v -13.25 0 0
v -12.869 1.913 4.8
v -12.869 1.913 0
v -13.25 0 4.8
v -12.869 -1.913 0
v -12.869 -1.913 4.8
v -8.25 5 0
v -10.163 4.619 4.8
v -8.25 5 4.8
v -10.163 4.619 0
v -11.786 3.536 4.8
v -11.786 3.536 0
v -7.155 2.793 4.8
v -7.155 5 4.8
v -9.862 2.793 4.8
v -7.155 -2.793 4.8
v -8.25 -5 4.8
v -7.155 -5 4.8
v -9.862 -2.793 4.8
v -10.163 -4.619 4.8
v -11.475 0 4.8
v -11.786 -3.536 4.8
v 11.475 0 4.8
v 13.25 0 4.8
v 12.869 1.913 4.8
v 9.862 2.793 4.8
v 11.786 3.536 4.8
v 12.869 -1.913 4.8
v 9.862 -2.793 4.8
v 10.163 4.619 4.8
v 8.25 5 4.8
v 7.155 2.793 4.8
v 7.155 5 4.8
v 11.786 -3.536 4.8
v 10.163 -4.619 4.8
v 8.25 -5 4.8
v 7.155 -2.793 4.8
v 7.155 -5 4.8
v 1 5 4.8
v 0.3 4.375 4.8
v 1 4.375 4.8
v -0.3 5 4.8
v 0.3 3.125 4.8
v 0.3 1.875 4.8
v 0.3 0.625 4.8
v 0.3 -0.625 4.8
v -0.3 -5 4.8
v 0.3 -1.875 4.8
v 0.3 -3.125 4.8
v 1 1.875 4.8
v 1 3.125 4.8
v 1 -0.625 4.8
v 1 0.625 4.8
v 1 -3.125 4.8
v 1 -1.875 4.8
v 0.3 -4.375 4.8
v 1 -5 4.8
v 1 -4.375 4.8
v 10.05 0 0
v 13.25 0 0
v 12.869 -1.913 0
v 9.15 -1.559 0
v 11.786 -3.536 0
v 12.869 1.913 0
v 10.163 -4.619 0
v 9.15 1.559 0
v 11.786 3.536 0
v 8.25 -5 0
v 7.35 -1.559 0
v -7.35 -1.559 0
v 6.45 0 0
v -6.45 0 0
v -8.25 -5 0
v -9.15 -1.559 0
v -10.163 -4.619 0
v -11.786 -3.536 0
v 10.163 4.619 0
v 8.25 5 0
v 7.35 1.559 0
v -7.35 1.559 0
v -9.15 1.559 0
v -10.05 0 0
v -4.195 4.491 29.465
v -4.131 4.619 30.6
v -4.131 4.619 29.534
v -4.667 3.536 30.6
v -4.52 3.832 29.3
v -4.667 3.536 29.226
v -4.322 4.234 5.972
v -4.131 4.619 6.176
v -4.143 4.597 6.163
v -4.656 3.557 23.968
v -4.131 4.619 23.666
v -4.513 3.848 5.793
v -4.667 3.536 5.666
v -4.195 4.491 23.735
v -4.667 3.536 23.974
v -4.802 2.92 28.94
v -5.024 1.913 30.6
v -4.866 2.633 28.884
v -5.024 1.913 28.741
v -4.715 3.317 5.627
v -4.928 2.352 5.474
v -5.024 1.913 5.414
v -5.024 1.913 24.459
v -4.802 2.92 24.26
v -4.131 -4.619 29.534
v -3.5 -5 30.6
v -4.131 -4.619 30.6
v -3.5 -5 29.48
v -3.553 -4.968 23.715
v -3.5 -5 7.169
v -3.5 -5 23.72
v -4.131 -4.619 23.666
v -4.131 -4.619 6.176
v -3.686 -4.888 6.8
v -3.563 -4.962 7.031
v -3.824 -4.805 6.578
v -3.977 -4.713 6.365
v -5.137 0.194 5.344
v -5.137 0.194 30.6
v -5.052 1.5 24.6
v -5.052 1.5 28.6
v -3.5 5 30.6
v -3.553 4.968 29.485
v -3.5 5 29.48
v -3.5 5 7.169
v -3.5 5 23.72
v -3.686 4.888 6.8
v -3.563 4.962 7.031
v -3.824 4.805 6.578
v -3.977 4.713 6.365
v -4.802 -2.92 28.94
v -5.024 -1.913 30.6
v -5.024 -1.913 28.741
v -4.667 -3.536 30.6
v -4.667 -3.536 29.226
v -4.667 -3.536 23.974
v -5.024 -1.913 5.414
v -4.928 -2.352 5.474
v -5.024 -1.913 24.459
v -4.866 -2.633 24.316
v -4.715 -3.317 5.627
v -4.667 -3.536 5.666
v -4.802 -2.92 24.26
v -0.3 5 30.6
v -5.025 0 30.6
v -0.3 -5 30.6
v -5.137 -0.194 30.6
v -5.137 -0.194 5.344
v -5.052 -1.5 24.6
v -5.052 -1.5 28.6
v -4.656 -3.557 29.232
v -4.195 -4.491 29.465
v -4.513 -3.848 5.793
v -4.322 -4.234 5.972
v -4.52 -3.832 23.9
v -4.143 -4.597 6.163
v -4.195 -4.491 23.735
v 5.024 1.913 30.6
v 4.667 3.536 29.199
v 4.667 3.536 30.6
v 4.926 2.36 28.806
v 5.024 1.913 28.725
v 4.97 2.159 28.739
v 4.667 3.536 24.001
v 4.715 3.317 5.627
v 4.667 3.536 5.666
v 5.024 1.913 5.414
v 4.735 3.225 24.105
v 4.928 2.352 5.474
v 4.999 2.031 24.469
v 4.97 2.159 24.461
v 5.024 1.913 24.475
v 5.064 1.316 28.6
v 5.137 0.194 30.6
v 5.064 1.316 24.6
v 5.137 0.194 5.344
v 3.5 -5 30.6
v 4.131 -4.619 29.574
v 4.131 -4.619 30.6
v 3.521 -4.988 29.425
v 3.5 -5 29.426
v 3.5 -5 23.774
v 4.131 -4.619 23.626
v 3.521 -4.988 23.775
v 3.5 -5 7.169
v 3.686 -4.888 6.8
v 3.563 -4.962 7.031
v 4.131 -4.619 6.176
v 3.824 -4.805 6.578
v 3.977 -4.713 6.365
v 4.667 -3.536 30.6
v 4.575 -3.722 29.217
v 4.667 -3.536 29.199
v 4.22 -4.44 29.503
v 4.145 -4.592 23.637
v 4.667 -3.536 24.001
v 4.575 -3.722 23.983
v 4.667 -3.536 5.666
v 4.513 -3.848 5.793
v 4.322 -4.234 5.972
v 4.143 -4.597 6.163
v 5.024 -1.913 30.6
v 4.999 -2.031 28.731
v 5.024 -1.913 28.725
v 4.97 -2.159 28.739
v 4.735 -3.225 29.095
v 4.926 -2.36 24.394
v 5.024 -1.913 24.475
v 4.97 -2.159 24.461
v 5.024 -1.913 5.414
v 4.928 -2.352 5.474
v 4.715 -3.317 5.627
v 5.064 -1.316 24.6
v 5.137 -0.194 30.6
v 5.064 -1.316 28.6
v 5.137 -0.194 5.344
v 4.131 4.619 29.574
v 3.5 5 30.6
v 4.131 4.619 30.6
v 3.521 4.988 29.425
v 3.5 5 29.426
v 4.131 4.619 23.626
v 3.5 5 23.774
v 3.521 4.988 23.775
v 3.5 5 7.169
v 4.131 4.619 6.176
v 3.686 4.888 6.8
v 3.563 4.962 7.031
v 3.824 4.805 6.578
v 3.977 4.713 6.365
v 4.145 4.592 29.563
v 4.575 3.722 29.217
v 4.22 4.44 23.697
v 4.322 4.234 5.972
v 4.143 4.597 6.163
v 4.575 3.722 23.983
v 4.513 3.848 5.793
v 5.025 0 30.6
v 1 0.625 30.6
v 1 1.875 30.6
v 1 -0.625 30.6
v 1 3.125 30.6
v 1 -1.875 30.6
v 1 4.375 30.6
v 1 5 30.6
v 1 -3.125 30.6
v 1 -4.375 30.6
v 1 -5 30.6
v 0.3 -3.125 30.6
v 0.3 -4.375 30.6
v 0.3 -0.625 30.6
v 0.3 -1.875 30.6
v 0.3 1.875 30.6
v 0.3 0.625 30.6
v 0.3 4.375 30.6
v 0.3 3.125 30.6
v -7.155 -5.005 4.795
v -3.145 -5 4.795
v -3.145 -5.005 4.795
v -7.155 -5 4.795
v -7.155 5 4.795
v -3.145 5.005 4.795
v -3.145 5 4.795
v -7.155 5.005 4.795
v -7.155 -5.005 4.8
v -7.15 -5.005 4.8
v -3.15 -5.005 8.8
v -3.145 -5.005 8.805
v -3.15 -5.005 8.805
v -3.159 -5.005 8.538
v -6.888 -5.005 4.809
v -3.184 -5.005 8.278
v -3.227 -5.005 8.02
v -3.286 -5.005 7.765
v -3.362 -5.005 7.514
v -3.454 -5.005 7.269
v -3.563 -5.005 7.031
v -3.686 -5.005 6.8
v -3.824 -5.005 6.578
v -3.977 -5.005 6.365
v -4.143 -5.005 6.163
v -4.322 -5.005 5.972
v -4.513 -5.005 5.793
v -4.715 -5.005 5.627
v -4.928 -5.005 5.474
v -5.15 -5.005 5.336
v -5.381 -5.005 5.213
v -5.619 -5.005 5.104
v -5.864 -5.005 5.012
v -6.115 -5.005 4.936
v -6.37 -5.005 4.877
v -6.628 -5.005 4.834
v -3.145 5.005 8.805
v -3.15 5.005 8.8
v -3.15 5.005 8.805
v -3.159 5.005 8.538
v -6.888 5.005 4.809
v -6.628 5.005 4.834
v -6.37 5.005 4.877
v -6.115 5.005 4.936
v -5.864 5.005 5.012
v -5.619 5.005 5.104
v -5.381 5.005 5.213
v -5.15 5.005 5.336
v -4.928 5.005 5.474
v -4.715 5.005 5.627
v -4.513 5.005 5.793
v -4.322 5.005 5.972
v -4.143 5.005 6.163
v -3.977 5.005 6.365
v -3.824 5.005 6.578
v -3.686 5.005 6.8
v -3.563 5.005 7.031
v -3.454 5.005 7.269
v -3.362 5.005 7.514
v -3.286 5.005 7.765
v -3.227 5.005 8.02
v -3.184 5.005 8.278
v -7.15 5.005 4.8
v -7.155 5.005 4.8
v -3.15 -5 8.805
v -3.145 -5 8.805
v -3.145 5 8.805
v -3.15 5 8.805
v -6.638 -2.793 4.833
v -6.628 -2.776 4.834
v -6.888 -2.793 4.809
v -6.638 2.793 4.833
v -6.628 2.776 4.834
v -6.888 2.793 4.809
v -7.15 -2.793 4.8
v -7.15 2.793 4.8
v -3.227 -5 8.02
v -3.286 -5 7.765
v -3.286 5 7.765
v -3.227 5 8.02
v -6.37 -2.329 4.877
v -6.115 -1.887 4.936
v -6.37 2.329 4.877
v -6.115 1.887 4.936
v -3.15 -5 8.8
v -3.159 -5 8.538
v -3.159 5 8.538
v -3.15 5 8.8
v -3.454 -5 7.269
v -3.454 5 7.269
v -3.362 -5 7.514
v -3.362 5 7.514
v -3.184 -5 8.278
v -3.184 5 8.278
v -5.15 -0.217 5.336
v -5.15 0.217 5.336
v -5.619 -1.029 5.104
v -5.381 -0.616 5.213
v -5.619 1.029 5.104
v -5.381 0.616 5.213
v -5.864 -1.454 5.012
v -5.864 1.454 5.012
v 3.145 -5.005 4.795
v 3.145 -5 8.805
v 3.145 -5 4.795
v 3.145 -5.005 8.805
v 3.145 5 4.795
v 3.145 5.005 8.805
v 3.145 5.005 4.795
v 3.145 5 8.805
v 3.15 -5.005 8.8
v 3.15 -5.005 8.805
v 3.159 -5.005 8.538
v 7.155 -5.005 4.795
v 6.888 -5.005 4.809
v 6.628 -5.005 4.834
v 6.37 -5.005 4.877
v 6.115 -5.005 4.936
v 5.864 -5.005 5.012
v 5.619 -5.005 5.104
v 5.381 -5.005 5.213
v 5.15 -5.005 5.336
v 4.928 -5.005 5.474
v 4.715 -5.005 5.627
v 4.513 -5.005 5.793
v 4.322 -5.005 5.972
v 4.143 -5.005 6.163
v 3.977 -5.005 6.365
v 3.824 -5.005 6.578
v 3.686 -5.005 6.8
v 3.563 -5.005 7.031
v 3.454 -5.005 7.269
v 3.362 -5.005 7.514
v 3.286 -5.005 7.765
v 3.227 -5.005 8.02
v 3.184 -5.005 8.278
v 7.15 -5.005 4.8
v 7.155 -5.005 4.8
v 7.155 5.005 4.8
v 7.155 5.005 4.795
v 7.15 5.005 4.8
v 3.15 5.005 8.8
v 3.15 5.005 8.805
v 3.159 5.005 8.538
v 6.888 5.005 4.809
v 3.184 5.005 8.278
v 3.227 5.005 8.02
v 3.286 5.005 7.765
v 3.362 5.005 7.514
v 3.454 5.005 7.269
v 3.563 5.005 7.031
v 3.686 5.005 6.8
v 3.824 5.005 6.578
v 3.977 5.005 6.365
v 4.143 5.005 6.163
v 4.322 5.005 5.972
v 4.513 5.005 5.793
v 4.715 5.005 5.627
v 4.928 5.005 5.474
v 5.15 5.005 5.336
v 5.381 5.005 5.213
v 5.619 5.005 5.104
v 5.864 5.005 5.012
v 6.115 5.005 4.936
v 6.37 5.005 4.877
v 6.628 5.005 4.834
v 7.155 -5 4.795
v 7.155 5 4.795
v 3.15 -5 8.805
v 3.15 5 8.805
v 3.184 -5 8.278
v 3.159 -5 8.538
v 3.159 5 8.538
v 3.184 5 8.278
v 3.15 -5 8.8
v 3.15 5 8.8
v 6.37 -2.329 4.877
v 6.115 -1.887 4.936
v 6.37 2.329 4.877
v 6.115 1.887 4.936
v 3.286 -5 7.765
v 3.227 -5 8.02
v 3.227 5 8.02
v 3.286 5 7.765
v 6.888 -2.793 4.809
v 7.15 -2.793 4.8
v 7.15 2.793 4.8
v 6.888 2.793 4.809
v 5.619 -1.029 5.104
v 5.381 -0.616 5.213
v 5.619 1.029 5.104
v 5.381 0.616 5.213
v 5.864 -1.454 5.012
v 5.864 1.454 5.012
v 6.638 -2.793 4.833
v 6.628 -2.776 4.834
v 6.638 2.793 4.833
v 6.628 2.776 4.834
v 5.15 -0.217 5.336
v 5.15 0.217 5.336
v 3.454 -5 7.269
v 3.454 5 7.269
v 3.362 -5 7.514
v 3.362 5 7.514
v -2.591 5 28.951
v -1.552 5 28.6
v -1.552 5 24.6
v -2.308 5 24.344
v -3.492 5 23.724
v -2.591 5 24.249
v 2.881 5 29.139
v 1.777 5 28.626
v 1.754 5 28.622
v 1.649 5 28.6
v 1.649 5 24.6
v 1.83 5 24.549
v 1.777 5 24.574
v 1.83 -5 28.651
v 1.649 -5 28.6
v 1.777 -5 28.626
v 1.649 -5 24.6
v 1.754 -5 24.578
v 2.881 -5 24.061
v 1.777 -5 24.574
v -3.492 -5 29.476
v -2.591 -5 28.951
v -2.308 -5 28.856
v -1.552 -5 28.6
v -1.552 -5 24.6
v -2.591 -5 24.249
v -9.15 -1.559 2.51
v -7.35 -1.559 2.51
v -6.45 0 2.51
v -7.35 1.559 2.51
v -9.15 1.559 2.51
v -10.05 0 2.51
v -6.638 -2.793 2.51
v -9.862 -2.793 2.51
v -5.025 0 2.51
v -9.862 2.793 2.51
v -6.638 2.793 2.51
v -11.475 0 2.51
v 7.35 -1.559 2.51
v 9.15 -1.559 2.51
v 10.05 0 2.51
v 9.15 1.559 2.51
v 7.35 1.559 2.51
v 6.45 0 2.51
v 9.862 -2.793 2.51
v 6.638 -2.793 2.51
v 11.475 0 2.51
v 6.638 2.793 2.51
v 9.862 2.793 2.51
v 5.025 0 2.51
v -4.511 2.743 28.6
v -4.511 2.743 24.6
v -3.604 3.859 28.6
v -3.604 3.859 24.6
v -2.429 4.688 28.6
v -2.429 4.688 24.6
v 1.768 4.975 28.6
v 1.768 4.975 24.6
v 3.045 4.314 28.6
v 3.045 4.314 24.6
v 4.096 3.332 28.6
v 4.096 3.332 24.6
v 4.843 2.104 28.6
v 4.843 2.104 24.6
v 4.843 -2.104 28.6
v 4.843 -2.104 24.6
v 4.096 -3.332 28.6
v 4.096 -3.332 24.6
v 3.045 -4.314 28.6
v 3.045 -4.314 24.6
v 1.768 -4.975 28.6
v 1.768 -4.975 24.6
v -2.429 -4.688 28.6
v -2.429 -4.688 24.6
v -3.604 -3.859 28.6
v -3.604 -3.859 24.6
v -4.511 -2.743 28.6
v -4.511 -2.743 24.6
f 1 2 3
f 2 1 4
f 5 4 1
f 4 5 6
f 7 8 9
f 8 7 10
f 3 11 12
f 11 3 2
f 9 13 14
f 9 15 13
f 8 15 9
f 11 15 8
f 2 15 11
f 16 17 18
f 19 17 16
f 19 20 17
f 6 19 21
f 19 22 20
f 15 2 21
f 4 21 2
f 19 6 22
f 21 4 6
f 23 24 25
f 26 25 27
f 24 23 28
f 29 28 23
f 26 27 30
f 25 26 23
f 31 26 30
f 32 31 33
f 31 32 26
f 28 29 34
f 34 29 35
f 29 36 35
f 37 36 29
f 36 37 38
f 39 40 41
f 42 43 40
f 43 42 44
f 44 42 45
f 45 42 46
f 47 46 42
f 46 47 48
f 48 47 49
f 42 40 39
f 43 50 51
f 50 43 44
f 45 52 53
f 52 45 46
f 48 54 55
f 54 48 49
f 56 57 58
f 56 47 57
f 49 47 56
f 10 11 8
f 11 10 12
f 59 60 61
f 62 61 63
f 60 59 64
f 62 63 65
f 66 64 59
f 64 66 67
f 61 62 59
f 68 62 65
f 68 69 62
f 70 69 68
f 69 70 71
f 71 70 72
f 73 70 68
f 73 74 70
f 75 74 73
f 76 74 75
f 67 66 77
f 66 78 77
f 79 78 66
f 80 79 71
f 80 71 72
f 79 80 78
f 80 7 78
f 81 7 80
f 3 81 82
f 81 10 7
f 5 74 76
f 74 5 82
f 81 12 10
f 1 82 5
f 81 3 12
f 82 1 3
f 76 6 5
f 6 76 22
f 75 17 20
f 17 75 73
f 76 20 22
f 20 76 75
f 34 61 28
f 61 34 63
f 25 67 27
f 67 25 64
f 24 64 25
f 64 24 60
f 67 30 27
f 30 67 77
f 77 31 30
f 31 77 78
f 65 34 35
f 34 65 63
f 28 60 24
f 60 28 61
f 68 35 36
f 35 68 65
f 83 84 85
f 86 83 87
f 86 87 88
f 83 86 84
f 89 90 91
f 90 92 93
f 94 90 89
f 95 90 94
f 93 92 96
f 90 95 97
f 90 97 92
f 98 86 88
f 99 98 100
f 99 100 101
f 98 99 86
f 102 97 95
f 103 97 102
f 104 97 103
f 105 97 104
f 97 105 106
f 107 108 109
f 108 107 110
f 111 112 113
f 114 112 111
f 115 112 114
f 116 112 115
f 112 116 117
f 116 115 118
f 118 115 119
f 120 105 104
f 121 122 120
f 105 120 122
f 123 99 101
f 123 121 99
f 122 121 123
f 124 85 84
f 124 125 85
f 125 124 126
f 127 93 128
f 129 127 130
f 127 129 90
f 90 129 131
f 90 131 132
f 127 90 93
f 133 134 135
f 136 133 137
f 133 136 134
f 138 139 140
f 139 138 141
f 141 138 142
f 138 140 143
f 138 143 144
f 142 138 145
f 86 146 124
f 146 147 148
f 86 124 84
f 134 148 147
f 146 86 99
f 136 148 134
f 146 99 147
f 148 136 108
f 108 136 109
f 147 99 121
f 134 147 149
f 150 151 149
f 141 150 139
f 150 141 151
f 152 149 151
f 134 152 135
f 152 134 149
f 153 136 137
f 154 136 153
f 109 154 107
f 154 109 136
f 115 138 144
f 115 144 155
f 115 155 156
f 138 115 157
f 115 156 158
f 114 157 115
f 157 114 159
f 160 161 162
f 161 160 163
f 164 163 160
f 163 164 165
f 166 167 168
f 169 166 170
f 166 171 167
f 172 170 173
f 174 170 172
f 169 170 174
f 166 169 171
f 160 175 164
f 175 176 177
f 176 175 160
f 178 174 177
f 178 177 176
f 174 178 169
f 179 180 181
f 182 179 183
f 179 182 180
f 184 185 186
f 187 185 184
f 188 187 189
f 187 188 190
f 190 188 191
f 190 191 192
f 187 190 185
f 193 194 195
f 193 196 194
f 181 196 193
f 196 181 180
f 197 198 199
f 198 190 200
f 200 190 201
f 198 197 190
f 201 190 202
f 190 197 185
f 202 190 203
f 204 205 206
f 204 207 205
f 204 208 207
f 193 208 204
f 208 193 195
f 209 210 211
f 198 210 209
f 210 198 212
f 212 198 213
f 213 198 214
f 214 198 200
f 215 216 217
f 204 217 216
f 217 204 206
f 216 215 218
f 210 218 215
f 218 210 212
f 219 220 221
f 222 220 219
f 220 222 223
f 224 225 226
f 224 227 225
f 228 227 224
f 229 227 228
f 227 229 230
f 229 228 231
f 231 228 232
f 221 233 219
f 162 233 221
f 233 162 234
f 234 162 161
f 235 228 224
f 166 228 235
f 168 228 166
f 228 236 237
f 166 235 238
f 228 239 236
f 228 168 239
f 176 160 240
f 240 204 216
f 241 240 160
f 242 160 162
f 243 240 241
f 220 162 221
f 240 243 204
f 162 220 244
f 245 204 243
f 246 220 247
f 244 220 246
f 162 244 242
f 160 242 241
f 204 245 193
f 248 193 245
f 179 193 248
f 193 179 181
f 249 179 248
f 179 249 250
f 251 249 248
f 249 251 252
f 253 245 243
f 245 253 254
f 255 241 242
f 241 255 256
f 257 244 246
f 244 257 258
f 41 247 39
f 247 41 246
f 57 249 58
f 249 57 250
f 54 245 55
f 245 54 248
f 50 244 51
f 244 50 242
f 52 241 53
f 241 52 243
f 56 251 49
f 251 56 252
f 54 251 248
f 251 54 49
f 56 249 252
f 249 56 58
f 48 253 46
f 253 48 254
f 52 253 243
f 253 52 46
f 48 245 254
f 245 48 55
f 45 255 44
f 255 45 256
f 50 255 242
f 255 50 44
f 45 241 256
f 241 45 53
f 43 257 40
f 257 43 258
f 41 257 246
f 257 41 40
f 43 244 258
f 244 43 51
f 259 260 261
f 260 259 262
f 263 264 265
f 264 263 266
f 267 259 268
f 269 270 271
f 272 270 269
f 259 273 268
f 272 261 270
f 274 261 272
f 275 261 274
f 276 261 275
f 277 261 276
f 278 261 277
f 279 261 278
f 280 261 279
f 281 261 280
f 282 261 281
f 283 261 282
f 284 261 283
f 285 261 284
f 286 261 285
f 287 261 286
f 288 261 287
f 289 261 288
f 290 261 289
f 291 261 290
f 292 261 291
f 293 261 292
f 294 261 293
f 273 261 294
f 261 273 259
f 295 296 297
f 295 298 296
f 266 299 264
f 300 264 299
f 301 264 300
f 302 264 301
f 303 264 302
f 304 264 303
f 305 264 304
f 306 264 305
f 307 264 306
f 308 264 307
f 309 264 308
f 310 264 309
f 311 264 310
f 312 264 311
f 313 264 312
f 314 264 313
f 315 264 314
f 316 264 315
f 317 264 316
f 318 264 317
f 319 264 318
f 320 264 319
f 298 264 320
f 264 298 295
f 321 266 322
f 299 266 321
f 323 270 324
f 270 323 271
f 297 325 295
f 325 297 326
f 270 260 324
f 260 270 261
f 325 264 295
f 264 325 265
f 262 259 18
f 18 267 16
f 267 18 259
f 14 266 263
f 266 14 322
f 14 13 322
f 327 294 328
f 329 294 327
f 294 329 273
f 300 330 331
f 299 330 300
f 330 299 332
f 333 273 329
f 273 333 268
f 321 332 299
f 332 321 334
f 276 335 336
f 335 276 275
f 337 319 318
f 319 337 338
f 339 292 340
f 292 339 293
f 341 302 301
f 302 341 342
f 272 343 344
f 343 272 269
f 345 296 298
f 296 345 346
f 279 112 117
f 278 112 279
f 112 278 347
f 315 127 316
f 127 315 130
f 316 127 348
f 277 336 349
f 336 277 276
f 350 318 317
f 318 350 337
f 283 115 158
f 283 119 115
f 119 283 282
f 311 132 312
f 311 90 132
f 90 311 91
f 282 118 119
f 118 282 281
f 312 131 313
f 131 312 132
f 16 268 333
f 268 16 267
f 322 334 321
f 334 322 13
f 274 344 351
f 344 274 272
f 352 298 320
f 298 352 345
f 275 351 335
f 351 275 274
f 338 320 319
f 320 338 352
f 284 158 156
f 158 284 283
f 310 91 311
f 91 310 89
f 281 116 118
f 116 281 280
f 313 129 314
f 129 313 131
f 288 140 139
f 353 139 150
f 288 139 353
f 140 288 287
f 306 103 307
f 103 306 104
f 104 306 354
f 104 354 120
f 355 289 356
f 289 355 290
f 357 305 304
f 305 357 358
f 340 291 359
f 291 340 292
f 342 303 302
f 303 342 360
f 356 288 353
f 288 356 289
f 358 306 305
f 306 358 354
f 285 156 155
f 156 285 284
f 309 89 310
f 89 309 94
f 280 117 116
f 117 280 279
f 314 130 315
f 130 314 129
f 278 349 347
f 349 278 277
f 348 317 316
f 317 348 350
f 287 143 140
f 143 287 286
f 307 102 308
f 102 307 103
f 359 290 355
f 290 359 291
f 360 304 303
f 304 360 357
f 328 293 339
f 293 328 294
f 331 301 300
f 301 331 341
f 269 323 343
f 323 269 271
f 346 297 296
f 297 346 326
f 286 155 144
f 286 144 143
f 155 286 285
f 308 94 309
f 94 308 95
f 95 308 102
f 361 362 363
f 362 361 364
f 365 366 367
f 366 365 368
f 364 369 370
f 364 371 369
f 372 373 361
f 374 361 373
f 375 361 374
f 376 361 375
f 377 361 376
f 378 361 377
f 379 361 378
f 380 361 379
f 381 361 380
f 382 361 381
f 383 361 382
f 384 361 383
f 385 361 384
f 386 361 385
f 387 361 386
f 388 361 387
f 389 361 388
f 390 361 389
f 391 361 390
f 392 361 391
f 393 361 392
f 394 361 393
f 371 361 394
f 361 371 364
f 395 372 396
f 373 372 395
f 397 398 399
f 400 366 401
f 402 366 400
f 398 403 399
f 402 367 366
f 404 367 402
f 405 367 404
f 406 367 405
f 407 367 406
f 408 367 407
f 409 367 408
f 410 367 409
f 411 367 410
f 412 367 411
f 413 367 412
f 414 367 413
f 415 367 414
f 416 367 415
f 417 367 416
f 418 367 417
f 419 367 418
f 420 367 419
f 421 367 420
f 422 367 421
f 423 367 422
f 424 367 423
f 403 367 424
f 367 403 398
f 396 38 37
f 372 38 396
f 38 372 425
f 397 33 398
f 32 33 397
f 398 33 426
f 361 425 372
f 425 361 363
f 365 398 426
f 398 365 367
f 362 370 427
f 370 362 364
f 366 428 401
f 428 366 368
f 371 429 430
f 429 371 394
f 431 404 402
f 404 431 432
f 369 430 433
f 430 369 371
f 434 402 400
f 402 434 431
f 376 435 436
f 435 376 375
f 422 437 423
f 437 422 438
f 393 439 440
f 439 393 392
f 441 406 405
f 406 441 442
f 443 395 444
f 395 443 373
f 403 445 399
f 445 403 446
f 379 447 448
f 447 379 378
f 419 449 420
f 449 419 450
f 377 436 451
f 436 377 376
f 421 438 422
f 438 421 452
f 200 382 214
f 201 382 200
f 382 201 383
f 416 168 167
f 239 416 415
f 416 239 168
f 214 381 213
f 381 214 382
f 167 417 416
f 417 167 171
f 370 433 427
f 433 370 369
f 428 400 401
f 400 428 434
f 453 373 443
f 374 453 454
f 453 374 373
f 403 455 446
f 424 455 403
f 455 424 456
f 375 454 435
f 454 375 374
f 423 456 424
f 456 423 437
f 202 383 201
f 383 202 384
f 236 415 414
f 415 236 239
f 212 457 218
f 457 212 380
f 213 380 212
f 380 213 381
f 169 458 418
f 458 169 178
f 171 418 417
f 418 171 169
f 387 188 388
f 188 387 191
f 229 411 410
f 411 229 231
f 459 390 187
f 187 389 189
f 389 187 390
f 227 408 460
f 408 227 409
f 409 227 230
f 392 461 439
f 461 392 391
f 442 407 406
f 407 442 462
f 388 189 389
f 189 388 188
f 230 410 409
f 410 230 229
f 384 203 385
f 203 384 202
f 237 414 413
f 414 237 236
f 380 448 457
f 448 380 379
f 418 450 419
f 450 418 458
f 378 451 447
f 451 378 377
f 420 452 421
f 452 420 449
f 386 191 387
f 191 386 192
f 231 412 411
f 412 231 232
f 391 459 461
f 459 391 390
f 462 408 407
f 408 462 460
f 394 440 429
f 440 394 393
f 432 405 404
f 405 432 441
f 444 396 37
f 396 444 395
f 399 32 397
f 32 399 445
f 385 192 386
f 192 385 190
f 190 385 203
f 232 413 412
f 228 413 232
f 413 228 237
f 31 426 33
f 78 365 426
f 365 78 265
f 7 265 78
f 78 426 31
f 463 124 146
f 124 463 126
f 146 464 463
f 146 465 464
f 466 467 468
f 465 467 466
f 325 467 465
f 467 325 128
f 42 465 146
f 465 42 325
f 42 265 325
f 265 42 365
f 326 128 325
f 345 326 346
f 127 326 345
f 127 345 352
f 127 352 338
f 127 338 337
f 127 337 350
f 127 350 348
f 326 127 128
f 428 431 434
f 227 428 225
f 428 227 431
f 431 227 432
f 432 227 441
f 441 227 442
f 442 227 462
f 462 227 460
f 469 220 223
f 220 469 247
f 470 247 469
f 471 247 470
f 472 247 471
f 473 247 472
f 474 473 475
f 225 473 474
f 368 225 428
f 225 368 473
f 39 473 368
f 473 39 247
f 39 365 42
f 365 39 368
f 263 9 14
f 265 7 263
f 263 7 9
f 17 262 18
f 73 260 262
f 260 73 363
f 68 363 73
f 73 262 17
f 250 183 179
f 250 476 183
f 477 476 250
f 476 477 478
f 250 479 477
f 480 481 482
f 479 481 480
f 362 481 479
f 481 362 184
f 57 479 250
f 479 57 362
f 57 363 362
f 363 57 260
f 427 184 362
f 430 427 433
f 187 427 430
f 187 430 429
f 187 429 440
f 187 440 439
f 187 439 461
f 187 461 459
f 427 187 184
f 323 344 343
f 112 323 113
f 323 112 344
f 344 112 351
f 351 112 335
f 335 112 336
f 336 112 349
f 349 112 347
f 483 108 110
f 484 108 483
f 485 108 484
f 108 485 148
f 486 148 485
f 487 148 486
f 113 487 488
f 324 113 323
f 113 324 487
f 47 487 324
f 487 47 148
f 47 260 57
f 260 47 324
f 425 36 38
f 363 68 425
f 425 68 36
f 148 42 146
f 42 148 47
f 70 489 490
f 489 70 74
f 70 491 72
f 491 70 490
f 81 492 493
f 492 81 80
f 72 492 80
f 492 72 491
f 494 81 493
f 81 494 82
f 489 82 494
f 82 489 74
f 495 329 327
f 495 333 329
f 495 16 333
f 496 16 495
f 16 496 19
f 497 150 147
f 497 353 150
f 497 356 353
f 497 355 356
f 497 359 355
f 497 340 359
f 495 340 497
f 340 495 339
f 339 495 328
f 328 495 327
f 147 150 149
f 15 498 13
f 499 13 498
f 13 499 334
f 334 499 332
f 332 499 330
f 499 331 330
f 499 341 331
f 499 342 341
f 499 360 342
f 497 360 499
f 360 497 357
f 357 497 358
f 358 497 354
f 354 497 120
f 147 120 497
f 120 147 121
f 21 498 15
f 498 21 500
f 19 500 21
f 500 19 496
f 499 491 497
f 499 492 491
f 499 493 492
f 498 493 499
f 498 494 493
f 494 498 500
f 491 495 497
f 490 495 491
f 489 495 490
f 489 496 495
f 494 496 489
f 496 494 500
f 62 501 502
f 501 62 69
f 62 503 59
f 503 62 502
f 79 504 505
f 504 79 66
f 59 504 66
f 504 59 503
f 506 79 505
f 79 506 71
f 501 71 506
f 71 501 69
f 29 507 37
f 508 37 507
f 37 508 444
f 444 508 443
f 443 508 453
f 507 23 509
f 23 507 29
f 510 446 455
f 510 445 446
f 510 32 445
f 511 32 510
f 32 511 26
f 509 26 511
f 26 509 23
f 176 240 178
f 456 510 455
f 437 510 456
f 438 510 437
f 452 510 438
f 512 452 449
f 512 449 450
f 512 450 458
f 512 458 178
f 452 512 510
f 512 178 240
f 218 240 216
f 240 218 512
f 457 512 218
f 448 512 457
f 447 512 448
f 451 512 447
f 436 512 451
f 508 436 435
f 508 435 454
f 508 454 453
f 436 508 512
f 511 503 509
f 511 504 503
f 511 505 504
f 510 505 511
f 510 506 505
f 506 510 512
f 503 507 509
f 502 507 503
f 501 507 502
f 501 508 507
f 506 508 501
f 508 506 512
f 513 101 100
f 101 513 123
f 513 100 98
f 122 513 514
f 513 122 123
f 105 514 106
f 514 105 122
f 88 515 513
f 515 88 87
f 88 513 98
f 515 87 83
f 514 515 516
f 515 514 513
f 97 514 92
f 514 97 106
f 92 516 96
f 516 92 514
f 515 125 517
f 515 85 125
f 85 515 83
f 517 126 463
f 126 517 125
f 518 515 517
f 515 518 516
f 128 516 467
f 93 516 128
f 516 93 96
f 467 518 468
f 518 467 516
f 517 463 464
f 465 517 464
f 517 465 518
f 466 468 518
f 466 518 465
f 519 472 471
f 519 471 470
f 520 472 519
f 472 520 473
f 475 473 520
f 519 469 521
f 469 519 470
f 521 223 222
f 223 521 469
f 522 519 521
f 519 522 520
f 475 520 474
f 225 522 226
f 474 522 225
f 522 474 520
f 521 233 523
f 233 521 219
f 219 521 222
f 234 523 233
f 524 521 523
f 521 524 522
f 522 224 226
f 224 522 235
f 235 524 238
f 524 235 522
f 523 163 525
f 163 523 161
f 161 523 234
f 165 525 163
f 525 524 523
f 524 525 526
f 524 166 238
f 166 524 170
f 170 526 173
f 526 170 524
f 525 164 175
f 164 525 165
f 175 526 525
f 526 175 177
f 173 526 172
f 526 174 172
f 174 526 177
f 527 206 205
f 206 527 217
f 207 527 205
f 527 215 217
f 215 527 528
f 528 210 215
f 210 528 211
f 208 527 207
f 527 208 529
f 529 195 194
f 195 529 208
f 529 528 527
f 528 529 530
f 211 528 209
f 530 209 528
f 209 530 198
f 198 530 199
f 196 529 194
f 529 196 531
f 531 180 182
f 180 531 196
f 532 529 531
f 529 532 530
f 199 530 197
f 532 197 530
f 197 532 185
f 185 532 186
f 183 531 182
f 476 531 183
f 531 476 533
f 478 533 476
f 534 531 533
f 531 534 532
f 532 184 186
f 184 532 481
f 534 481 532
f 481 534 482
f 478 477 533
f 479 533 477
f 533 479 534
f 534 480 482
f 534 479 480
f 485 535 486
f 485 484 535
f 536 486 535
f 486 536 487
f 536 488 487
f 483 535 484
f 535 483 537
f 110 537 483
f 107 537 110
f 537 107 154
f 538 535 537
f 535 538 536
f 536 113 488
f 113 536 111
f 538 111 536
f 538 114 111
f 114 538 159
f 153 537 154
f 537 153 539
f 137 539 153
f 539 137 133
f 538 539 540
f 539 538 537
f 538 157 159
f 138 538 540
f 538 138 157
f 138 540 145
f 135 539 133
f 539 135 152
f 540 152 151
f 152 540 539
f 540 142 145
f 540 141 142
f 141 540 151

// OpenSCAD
// file: utilities.scad
/*
 * Utility functions.
 *
 * Originally by Hans Häggström, 2010.
 * Dual licenced under Creative Commons Attribution-Share Alike 3.0 and LGPL2 or later
 */

//include <units.scad>


/******************** Disance Poins ******************************/
function distance3D(a,b) =sqrt( (a[0] - b[0])*(a[0] - b[0]) +
                                (a[1] - b[1])*(a[1] - b[1]) +
                                (a[2] - b[2])*(a[2] - b[2]) );
//Obsolet
function distance(a, b) = distance3D(a,b);

function distance2D(a,b) = sqrt( (a[0] - b[0])*(a[0] - b[0]) +
                                (a[1] - b[1])*(a[1] - b[1]));
								
function distance1D(a,b) = sqrt(a*a+b*b);
//Obsolet
function length2(a) = distance1D(a[0],a[1]);


/************************ vector *************************/
function normalized(a) = a / (max(distance3D([0,0,0], a), 0.00001));

function normalized_axis(a) = a == "x" ? [1, 0, 0]:
                   a == "y" ? [0, 1, 0]:
                   a == "z" ? [0, 0, 1]: normalized(a);

function angleOfNormalizedVector(n) = [0, -atan2(n[2], distance1D([n[0], n[1]])), atan2(n[1], n[0]) ];

function angle(v) = angleOfNormalizedVector(normalized(v));

function angleBetweenTwoPoints(a, b) = angle(normalized(b-a));

function _angleVectore2D(a) = atan2(a[0],a[1]);
function angle_betweentTwoPoints2D (a,b) = _angleVectore2D(b-a);


/********************** Circel ***************************/

function circel_area(r) = PI * r * r;

function circel_radius3Points(a,b,c) = (distance2D(a,b) * distance2D(b,c) * distance2D(c,a)) / (4 * triangle_area3Points(a,b,c));

function circel_radius3lengths(a,b,c) = (a*b*c) / (4 * triangle_area3lengths(a,b,c));


/********************** triangle **************************/
//Satz des Heron
function triangle_area3lengths(a,b,c) = sqrt((a+b+c)*(a+b-c)*(b+c-a)*(c+a-b))/4;

function triangle_area3Points(a,b,c) = triangle_area3lengths(distance2D(a,b),distance2D(b,c),distance2D(c,a));



/************************** coordinate systems translation ****/
//[radius,phi] <=> [x,y]
function conv2D_cartesian2polar(x) = [ distance1D(x[0],x[1]) , atan2(x[1],x[0]) ];
function conv2D_polar2cartesian(x) = [ x[0]*cos(x[1]) , x[0]*sin(x[1]) ];


CENTER = 0;
LEFT = -0.5;
RIGHT = 0.5;
TOP = 0.5;
BOTTOM = -0.5;

FlatCap =0;
ExtendedCap =0.5;
CutCap =-0.5;


module fromTo(from=[0,0,0], to=[1,0,0], size=[1, 1], align=[CENTER, CENTER], material=[0.5, 0.5, 0.5], name="", endExtras=[0,0], endCaps=[FlatCap, FlatCap], rotation=[0,0,0], printString=true) {

  angle = angleBetweenTwoPoints(from, to);
  length = distance(from, to) + endCaps[0]*size[0] + endCaps[1]*size[0] + endExtras[0] + endExtras[1];

  if (length > 0) {
    if (printString) echo(str( "  " ,name, " ", size[0], "mm x ", size[1], "mm, length ", length, "mm"));

    color(material)
      translate(from)
        rotate(angle)
          translate( [ -endCaps[0]*size[0] - endExtras[0], size[0]*(-0.5-align[0]), size[1]*(-0.5+align[1]) ] )
            rotate(rotation)
              scale([length, size[0], size[1]]) child();
  }
}

module part(name) {
  echo("");
  echo(str(name, ":"));
}
// file: config.scad
/* config [c]
 * Copyright (c) 2012 by Krallinger Sebastian [s.krallinger+cc@gmail.com]
 * Dual-licensed under 
 * Creative Commons Attribution-ShareAlike 3.0 (CC BY-SA) [http://creativecommons.org/licenses/by-sa/3.0/]
 * and
 * LGPL v2 or later [http://www.gnu.org/licenses/].
 */

/******************************************************************************/ 
/*                              Main configuration                            */
/******************************************************************************/

/*-----------------------------------x axis-----------------------------------*/
c_x_axis_length = 333; // usable lenth. If you use an extruder which is longer then the H-Xtruder-Mount.scad you have to add this overcut here.
c_x_axis_smoothRod_diam = 8.1;

c_x_axis_dist = 35;

/*-----------------------------------y axis-----------------------------------*/
c_y_axis_length = 333; // usable lenth. If your extruder nozzel exit is not center to the H-Xtruder-Mount.scad you have to add the offset here.
c_y_axis_smoothRod_diam = 8.1;
c_y_axis_tabel_zDirOffset = 14.321; // offset of the center of the y axis to the tabel contact plain

/*-----------------------------------z axis-----------------------------------*/
c_z_axis_length = 333; // usable lenth. If the nozzel of the extruder exids the lower edge of the H-X-Carriage.scad than you have to add the overcut here.
c_z_axis_smoothRod_diam = 12.2;

c_z_axis_rodsDist = 32; // distance between threded rod and smooth rod

/******************************************************************************/ 
/*                                  linear Bearings                           */
/******************************************************************************/
c_lber_length       = 24.2;
c_lber_diam         = 15.3;

/*-----------------------------------x axis-----------------------------------*/
c_xAxis_lber_length = c_lber_length;
c_xAxis_lber_diam   = c_lber_diam;
/*----------------------------------y axis------------------------------------*/
c_yAxis_lber_length = c_lber_length;
c_yAxis_lber_diam   = c_lber_diam;
/*----------------------------------z axis------------------------------------*/
c_zAxis_lber_length = c_lber_length;
c_zAxis_lber_diam   = 12 + c_lber_diam-8;

/******************************************************************************/ 
/*                                    BELT                                    */
/******************************************************************************/
c_belt_thickness      = 1.3;
c_belt_width          = 6;
c_belt_teethDist      = 2.5;
c_belt_teethDepth     = 0.7;

/*-----------------------------------x axis-----------------------------------*/
//belt
c_xAxis_belt_thickness      = c_belt_thickness;
c_xAxis_belt_width          = c_belt_width;
c_xAxis_belt_teethDist      = c_belt_teethDist;
c_xAxis_belt_teethDepth     = c_belt_teethDepth;

// pully
c_xAxis_pully_diam = 9-c_xAxis_belt_thickness*2; // innes (in the teeth molde) diameter of the pully

// diviater
c_xAxis_bearingDiviater_diam = 26; // diameter of the diviater (so the diameter of the centerpoint to the teeth top of the belt) 

// distances
c_xAxis_beltCenter_xAxisDist     = 38;
c_xAxis_beltCenter_motorScrewHoleDist     = 12;

c_xAxis_beltTop_topxAxisDist = -(c_x_axis_dist/2)+c_xAxis_pully_diam/2; // distece between center of the top x axis and toothed side of the belt in z dir

/*-----------------------------------y axis-----------------------------------*/
c_yAxis_belt_thickness      = c_belt_thickness;
c_yAxis_belt_width          = c_belt_width;
c_yAxis_belt_teethDist      = c_belt_teethDist;
c_yAxis_belt_teethDepth     = c_belt_teethDepth;

c_y_axis_beltCenter_zDirOffset = 14.6; // offset of the center of the belt to the tabel contact plain

/******************************************************************************/ 
/*                                  support                                   */
/******************************************************************************/
c_xDirSupp_thredRod_altitude    = [8.266,45.497];
c_xDirSupp_thredRod_zAxisDist   = 38.95-8.5;

/******************************************************************************/ 
/*                                  motor                                     */
/******************************************************************************/
c_motorShaft_diam            = 5; // motor axis diameter
c_motorShaft_length          = 25; // motor axis length from pilot
c_motorPilot_diam            = 27.5; // motor pilot diameter
c_motorScrewHole_diam        = 3.3; // motor screw holde diameter
c_motorScrewHoles_centerDist = 43.841/2; // motor holes distance from axis center
c_motor_sideLength           = 42.1; // length of the motor side (rectangular motor)

/*-----------------------------------x axis-----------------------------------*/
c_xAxis_motorShaft_diam            = c_motorShaft_diam;
c_xAxis_motorShaft_length          = c_motorShaft_length;
c_xAxis_motorPilot_diam            = c_motorPilot_diam ;
c_xAxis_motorScrewHole_diam        = c_motorScrewHole_diam ;
c_xAxis_motorScrewHoles_centerDist = c_motorScrewHoles_centerDist;
c_xAxis_motor_sideLength           = c_motor_sideLength;

/*-----------------------------------y axis-----------------------------------*/
c_yAxis_motorShaft_diam            = c_motorShaft_diam;
c_yAxis_motorShaft_length          = c_motorShaft_length;
c_yAxis_motorPilot_diam            = c_motorPilot_diam ;
c_yAxis_motorScrewHole_diam        = c_motorScrewHole_diam ;
c_yAxis_motorScrewHoles_centerDist = c_motorScrewHoles_centerDist;
c_yAxis_motor_sideLength           = c_motor_sideLength;

/*-----------------------------------z axis-----------------------------------*/
c_zAxis_motorShaft_diam            = c_motorShaft_diam;
c_zAxis_motorShaft_length          = c_motorShaft_length;
c_zAxis_motorPilot_diam            = c_motorPilot_diam ;
c_zAxis_motorScrewHole_diam        = c_motorScrewHole_diam ;
c_zAxis_motorScrewHoles_centerDist = c_motorScrewHoles_centerDist;
c_zAxis_motor_sideLength           = c_motor_sideLength;
// file: roundEdges.scad
/* roundEdges
 * Copyright (c) 2012 by Krallinger Sebastian [s.krallinger+cc@gmail.com]
 * Dual-licensed under 
 * Creative Commons Attribution-ShareAlike 3.0 (CC BY-SA) [http://creativecommons.org/licenses/by-sa/3.0/]
 * and
 * LGPL v2 or later [http://www.gnu.org/licenses/].
 */


//Rounded Edges
module roundEdge(_a=0,_r=1,_l=1,_fn=100){
	rotate (a=[0,0,_a]){
		translate(v=[_r,_r,0]){
			rotate (a=[0,0,0]) rotate (a=[0,0,180]){
				difference() {
					translate (v=[-OS/2,-OS/2,-OS/2])
						cube (size = [_r+OS,_r+OS,_l+OS],center=false );
					translate (v=[0,0,-OS*2/2])
						cylinder (h = _l+OS*2, r=_r, center = false, $fn=_fn);
				}
			}
		}
	}
}
//roundEdge(_a=0,_l=10);
// file: teardrop.scad
// teardrop V2


module teardrop (r=4.5,h=20,top_and_bottom=false)
{
	rotate([-270,0,90])
	linear_extrude(height=h,convexity=10)
	{
		circle(r=r);
		polygon(points=[[0,0],[r*cos(30),r*sin(30)],[0.5*r,r],[-0.5*r,r],[-r*cos(30),r*sin(30)]],
				paths=[[0,1,2,3,4]]);
		if (top_and_bottom)
		polygon(points=[[0,0],[r*cos(30),-r*sin(30)],[0.5*r,-r],[-0.5*r,-r],[-r*cos(30),-r*sin(30)]],
				paths=[[0,1,2,3,4]]);

	}
}

module teardropFlat (r=4.5,h=20,top_and_bottom=false)
{
	rotate([-270,0,90])
	linear_extrude(height=h,convexity=10)
	{
		circle(r=r);
		polygon(points=[[0,0],[r*cos(20),r*sin(20)],[0.6*r,r],[-0.6*r,r],[-r*cos(20),r*sin(20)]],
				paths=[[0,1,2,3,4]]);
		if (top_and_bottom)
		polygon(points=[[0,0],[r*cos(20),-r*sin(20)],[0.5*r,-r],[-0.5*r,-r],[-r*cos(20),-r*sin(20)]],
				paths=[[0,1,2,3,4]]);

	}
}

module teardropcentering (r=4.5,h=20)
{
	rotate([-270,0,90])
	linear_extrude(height=h)
	{
		circle(r=r, $fn = 24);
		polygon(points=[[0,0],[r*cos(30),r*sin(30)],[0.5*r,1.2*r],[-0.5*r,1.2*r],[-r*cos(30),r*sin(30)]],
				paths=[[0,1,2,3,4]]);
	}
}

module teardropcentering2 (r=4.5,h=20)
{
	//rotate([-270,0,90])
	difference(){
	linear_extrude(height=h)
	{
		circle(r=r, $fn = 24);
		polygon(points=[[0,0],[r*cos(30),r*sin(30)],[0.5*r,1.2*r],[-0.5*r,1.2*r],[-r*cos(30),r*sin(30)]],
				paths=[[0,1,2,3,4]]);
	}
	translate(v = [-1.5*r, -1.5*r,-1])cube(size =[3*r,1.5*r,h+2]);
	}
}
// file: H-Y-beltClamp_alternativ.scad
/* H-Y-BeltClamp_Alternativ [Ybdaa]
 * Copyright (c) 2012 by Krallinger Sebastian [s.krallinger+cc@gmail.com]
 * Dual-licensed under
 * Creative Commons Attribution-ShareAlike 3.0 (CC BY-SA) [http://creativecommons.org/licenses/by-sa/3.0/]
 * and
 * LGPL v2 or later [http://www.gnu.org/licenses/].
 */

include <config.scad>
include <units.scad>
include <utilities.scad>
include <metric.scad>

include <roundEdges.scad>



/*------------------------------------general---------------------------------*/
Ybda_mode = "-";
//Ybda_mode = "print";  $fn=24*4;   // can be print or inspect [overlays the Ybda_model with the original Ybda_model] (uncomment next line)
//Ybda_mode = "printSet";  $fn=24*4;
Ybda_mode = "inspect";
//Ybda_mode = "assembly";


Ybda_thinWallThickness   = 1;
Ybda_genWallThickness    = 2.5;
Ybda_strongWallThickness = 10;

Ybda_reinforcement_r = 4;

/*------------------------------------belt------------------------------------*/
Ybda_belt_thickness      = c_yAxis_belt_thickness;
Ybda_belt_width          = c_yAxis_belt_width;
Ybda_belt_teethDist      = c_yAxis_belt_teethDist;
Ybda_belt_teethDepth     = c_yAxis_belt_teethDepth;
Ybda_belt_topOffset      = c_y_axis_beltCenter_zDirOffset;  // from top plate to the top edge of the belt
Ybda_belt_tolerance      = [2,1]; //w,t

/*------------------------------------zip ties--------------------------------*/
Ybda_zipTies_width       = 4;
Ybda_zipTies_thickness   = 2;


/*------------------------------------internal--------------------------------*/
_Ybda_base_size = [Ybda_genWallThickness*2+ Ybda_belt_thickness*2 + Ybda_belt_tolerance[1]*2 + m3_nut_diameter*2 + 4* Ybda_thinWallThickness,
				   Ybda_strongWallThickness,
				   Ybda_genWallThickness+m3_nut_heigth];

_Ybda_clamp_heigt = Ybda_belt_topOffset + Ybda_belt_width + Ybda_belt_tolerance[1] + Ybda_zipTies_width + 2*Ybda_genWallThickness;

_Ybda_teeth_dist = (Ybda_belt_thickness- Ybda_belt_teethDepth);

module H_yBeltClam_alt(HasFoot = true) {
	difference() {
		union(){
			if (HasFoot)
			for (i=[-(_Ybda_base_size[0]-Ybda_strongWallThickness)/2, (_Ybda_base_size[0]-Ybda_strongWallThickness)/2]){
				translate([i, 0, 0])
				cylinder(r=_Ybda_base_size[1]/2, h=_Ybda_base_size[2], center=false);
			}

			if (HasFoot)
			translate([0, 0, _Ybda_base_size[2]/2])
				cube(size=_Ybda_base_size- [_Ybda_base_size[1],0,0], center=true);

			// outer clamp
			translate([(_Ybda_teeth_dist/2+Ybda_belt_teethDepth+Ybda_genWallThickness/2) * 1, 0, _Ybda_clamp_heigt/2])
				cube(size=[Ybda_genWallThickness, Ybda_strongWallThickness, _Ybda_clamp_heigt], center=true);
			translate([(_Ybda_teeth_dist/2+Ybda_genWallThickness/2 + Ybda_belt_teethDepth/2) * -1, 0, _Ybda_clamp_heigt/2])
				cube(size=[Ybda_genWallThickness + Ybda_belt_teethDepth, Ybda_strongWallThickness, _Ybda_clamp_heigt], center=true);

			// clamp support
			for (i=[-1,1])
			translate([(_Ybda_teeth_dist/2+Ybda_belt_teethDepth+Ybda_genWallThickness) * i, 0, 0])
			scale([0.33, 1, 1])
				cylinder(r=Ybda_strongWallThickness/2, h=_Ybda_clamp_heigt, center=false);

			// belt teeth conector
			for (y=[-Ybda_strongWallThickness/2+ Ybda_belt_teethDist/2:Ybda_belt_teethDist:Ybda_strongWallThickness/2- Ybda_belt_teethDepth/2])
			translate([(_Ybda_teeth_dist/2 + Ybda_belt_teethDepth/2), y, _Ybda_clamp_heigt/2])
				cube(size=[Ybda_belt_teethDepth, Ybda_belt_teethDist/2, _Ybda_clamp_heigt], center=true);


			if (HasFoot)
			for (i=[[-1,90],[1,0]])
			translate([(Ybda_belt_thickness/2+Ybda_genWallThickness)*i[0],_Ybda_base_size[1]/2, _Ybda_base_size[2]])
			rotate(a=90,v=X)
			 roundEdge(_a=i[1],_r=Ybda_reinforcement_r,_l=_Ybda_base_size[1],_fn=48*2);
		}
		union(){
			if (HasFoot)
			for (i=[-(_Ybda_base_size[0]-Ybda_strongWallThickness)/2, (_Ybda_base_size[0]-Ybda_strongWallThickness)/2])
			translate([i, 0, 0]) {
				translate([0, 0, -OS])
					cylinder(r=m3_diameter/2, h=_Ybda_base_size[2]+2*OS, center=false);

				translate([0, 0, _Ybda_base_size[2]-m3_nut_heigth+OS])
					cylinder(r=m3_nut_diameter/2, h=_Ybda_clamp_heigt, center=false,$fn=6);
			}

			//zip tie coutout
			translate([0, 0, _Ybda_clamp_heigt- Ybda_thinWallThickness - Ybda_zipTies_width*0.75]) {
				rotate_extrude(convexity = 10)
				translate([ distance1D(Ybda_strongWallThickness/2,Ybda_belt_thickness+Ybda_genWallThickness)- Ybda_zipTies_thickness/2,0, 0])
				rotate(a=-90,v=Z)
				polygon(points=[[-Ybda_zipTies_width/2,0],[Ybda_zipTies_width/2,0],[Ybda_zipTies_width,Ybda_zipTies_thickness],[-Ybda_zipTies_width,Ybda_zipTies_thickness],[-Ybda_zipTies_width/2,0]]);
				*difference() {


					cylinder(r=Ybda_strongWallThickness, h=Ybda_zipTies_thickness+2*OS, center=true);
					cylinder(r=distance1D(Ybda_strongWallThickness/2,Ybda_belt_thickness+Ybda_genWallThickness)- Ybda_zipTies_thickness/2, h=Ybda_zipTies_width, center=true);
				}
			}
		}
	}

}


if (Ybda_mode == "inspect") {
	H_yBeltClam_alt();
}

module H_yBeltClam_alt_prinSet() {
	for (i=[-Ybda_strongWallThickness/2-0.5,+Ybda_strongWallThickness/2+0.5])
	translate([0, i, 0])
	H_yBeltClam_alt();
}
if (Ybda_mode == "printSet") {
	H_yBeltClam_alt_prinSet();
}

module H_yBeltClam_alt_print() {
	H_yBeltClam_alt();
}
if (Ybda_mode == "print") {
	H_yBeltClam_alt_print();
}
// file: metric.scad
// PRUSA Mendel  
// Default metric sizes
// GNU GPL v2
// Josef Průša
// josefprusa@me.com
// prusadjs.cz
// http://www.reprap.org/wiki/Prusa_Mendel
// http://github.com/prusajr/PrusaMendel

// RODS

threaded_rod_diameter      = 8.2;
smooth_bar_diameter        = 8;

// Nuts and bolts
// For all nuttraps and screw holse 
m8_diameter                = 8.9;
m8_nut_diameter            = 15.3;
m8_nut_wallDist            = _wallDistFromDia(m8_nut_diameter);
m8_nut_heigth              = 6.3;

m4_diameter                = 4.5;
m4_nut_diameter            = 8.2;
m4_nut_heigth              = 3.2;

m3_diameter                = 3.6;
m3_nut_diameter            = 6.45;
m3_nut_heigth              = 2.3;
m3_nut_wallDist            = _wallDistFromDia(m3_nut_diameter);
m3_nut_diameter_horizontal = 6.1;

// elongetaed nuttraps
// where a nut is put in an slot and inthere hits the perpendicular threadhole
m3_elongNtt_tolerance      = [0.5,0,0.5];// additional [diameter,depth,height]  // depth is not implemented

// linear Bearings
lber_length                = 24;
lber_diam                  = 15.3;

// Motors

motor_shaft                = 5.5;


/******************************************************************************/ 
/*                                  INTERNAL                                  */
/******************************************************************************/
/*-----------------!!! do not change things below this !!!--------------------*/
m3_elongNtt_diameter = m3_nut_diameter + m3_elongNtt_tolerance[0];
m3_elongNtt_wallDist = _wallDistFromDia(m3_elongNtt_diameter);
m3_elongNtt_height = m3_nut_heigth + m3_elongNtt_tolerance[2];



function _wallDistFromDia(dia) = cos(30)*dia;
// file: units.scad
/*
 * Basic units.
 * 
 * Originally by Hans Häggström, 2010.
 * Dual licenced under Creative Commons Attribution-Share Alike 3.0 and LGPL2 or later
 */


mm = 1;
cm = 10 * mm;
dm = 100 * mm;
m = 1000 * mm;

inch = 25.4 * mm;

X = [1, 0, 0];
Y = [0, 1, 0];
Z = [0, 0, 1];

M3 = 3*mm;
M4 = 4*mm;
M5 = 5*mm;
M6 = 6*mm;
M8 = 8*mm;


// When a small distance is needed to overlap shapes for boolean cutting, etc.
epsilon = 0.01*mm;
OS = epsilon;  // Over size
// main file
/* TabelClamp [tc]
 * Copyright (c) 2012 by Krallinger Sebastian [s.krallinger+cc@gmail.com]
 * Dual-licensed under
 * Creative Commons Attribution-ShareAlike 3.0 (CC BY-SA) [http://creativecommons.org/licenses/by-sa/3.0/]
 * and
 * LGPL v2 or later [http://www.gnu.org/licenses/].
 */

include <units.scad>
include <metric.scad>
include <H-Y-beltClamp_alternativ.scad>
include <teardrop.scad>
include <roundEdges.scad>

/*------------------------------------general---------------------------------*/
tc_mode = "-";
// tc_mode = "print"; $fn=24*4;
// tc_mode = "printSet"; $fn=24*4;
// tc_mode = "inspect";

tc_thinWallThickness         = 1;
tc_genWallThickness          = 3;
tc_strongWallThickness       = 9;

tc_horizontalSuportThickness = 0.35;
tc_verticalSupportThickness  = 0.5;


/*------------------------------------screw-------------------------------------*/
tc_s_diameter                = 3.6;
tc_s_nut_diameter            = 6.53;
tc_s_nut_heigth              = 2.3;
tc_s_nut_wallDist            = _wallDistFromDia(m3_nut_diameter);
tc_s_nut_diameter_horizontal = 6.1;

/*------------------------------------general---------------------------------*/
tc_length                    = 12;
tc_tabelHocke_thickness      = 1;
tc_tabelHock_depth           = 1.5;
tc_overall_height            = tc_tabelHocke_thickness + 2.66;


/*--------------------------------------+-------------------------------------*/
tc_edge_radius               = tc_s_diameter;

/******************************************************************************/
/*                                  INTERNAL                                  */
/******************************************************************************/

module TabelClamp() {
	difference() {
		union(){
			translate([-tc_length/2, 0, 0])
				cube(size=[tc_length, tc_s_nut_wallDist+tc_thinWallThickness, tc_overall_height], center=false);

			translate([-tc_length/2, -tc_tabelHock_depth, tc_overall_height- tc_tabelHocke_thickness])
				cube(size=[tc_length, tc_tabelHock_depth, tc_tabelHocke_thickness], center=false);
		}
		union(){
			translate([0,  tc_s_nut_wallDist/2, 0]){
				//nut
				translate([0, 0, tc_overall_height - tc_s_nut_heigth + OS])
					cylinder(r=m3_nut_diameter/2, h=tc_s_nut_heigth, center=false, $fn = 6);
				//screw
				translate([0, 0, -OS])
					cylinder(r=tc_s_diameter/2, h=tc_overall_height- tc_s_nut_heigth - tc_horizontalSuportThickness +OS, center=false);
			}
			for (i=[[-90,-1],[180,1]])
			translate([i[1]*tc_length/2, tc_s_nut_wallDist+tc_thinWallThickness, -OS])
				roundEdge(_a=i[0],_r=tc_edge_radius,_l=tc_overall_height+2*OS,_fn=24*4);
		}
	}
}



if (tc_mode == "inspect") {
	TabelClamp();
}


module tc_print() {
	translate([0, 0, tc_overall_height])
	mirror([0, 0, 1])
		TabelClamp();
}
if (tc_mode == "print") {
	tc_print();
}


module tc_printSet() {
	for (x=[-1,1])
	translate([x*(tc_length/2+0.4), 0, 0])
		for (y=[[0,1],[180,-1]])
		translate([0, y[1]*(tc_tabelHock_depth + 0.4), 0])
		rotate(a=y[0],v=Z)
			tc_print();
}
if (tc_mode == "printSet") {
	tc_printSet();
}
